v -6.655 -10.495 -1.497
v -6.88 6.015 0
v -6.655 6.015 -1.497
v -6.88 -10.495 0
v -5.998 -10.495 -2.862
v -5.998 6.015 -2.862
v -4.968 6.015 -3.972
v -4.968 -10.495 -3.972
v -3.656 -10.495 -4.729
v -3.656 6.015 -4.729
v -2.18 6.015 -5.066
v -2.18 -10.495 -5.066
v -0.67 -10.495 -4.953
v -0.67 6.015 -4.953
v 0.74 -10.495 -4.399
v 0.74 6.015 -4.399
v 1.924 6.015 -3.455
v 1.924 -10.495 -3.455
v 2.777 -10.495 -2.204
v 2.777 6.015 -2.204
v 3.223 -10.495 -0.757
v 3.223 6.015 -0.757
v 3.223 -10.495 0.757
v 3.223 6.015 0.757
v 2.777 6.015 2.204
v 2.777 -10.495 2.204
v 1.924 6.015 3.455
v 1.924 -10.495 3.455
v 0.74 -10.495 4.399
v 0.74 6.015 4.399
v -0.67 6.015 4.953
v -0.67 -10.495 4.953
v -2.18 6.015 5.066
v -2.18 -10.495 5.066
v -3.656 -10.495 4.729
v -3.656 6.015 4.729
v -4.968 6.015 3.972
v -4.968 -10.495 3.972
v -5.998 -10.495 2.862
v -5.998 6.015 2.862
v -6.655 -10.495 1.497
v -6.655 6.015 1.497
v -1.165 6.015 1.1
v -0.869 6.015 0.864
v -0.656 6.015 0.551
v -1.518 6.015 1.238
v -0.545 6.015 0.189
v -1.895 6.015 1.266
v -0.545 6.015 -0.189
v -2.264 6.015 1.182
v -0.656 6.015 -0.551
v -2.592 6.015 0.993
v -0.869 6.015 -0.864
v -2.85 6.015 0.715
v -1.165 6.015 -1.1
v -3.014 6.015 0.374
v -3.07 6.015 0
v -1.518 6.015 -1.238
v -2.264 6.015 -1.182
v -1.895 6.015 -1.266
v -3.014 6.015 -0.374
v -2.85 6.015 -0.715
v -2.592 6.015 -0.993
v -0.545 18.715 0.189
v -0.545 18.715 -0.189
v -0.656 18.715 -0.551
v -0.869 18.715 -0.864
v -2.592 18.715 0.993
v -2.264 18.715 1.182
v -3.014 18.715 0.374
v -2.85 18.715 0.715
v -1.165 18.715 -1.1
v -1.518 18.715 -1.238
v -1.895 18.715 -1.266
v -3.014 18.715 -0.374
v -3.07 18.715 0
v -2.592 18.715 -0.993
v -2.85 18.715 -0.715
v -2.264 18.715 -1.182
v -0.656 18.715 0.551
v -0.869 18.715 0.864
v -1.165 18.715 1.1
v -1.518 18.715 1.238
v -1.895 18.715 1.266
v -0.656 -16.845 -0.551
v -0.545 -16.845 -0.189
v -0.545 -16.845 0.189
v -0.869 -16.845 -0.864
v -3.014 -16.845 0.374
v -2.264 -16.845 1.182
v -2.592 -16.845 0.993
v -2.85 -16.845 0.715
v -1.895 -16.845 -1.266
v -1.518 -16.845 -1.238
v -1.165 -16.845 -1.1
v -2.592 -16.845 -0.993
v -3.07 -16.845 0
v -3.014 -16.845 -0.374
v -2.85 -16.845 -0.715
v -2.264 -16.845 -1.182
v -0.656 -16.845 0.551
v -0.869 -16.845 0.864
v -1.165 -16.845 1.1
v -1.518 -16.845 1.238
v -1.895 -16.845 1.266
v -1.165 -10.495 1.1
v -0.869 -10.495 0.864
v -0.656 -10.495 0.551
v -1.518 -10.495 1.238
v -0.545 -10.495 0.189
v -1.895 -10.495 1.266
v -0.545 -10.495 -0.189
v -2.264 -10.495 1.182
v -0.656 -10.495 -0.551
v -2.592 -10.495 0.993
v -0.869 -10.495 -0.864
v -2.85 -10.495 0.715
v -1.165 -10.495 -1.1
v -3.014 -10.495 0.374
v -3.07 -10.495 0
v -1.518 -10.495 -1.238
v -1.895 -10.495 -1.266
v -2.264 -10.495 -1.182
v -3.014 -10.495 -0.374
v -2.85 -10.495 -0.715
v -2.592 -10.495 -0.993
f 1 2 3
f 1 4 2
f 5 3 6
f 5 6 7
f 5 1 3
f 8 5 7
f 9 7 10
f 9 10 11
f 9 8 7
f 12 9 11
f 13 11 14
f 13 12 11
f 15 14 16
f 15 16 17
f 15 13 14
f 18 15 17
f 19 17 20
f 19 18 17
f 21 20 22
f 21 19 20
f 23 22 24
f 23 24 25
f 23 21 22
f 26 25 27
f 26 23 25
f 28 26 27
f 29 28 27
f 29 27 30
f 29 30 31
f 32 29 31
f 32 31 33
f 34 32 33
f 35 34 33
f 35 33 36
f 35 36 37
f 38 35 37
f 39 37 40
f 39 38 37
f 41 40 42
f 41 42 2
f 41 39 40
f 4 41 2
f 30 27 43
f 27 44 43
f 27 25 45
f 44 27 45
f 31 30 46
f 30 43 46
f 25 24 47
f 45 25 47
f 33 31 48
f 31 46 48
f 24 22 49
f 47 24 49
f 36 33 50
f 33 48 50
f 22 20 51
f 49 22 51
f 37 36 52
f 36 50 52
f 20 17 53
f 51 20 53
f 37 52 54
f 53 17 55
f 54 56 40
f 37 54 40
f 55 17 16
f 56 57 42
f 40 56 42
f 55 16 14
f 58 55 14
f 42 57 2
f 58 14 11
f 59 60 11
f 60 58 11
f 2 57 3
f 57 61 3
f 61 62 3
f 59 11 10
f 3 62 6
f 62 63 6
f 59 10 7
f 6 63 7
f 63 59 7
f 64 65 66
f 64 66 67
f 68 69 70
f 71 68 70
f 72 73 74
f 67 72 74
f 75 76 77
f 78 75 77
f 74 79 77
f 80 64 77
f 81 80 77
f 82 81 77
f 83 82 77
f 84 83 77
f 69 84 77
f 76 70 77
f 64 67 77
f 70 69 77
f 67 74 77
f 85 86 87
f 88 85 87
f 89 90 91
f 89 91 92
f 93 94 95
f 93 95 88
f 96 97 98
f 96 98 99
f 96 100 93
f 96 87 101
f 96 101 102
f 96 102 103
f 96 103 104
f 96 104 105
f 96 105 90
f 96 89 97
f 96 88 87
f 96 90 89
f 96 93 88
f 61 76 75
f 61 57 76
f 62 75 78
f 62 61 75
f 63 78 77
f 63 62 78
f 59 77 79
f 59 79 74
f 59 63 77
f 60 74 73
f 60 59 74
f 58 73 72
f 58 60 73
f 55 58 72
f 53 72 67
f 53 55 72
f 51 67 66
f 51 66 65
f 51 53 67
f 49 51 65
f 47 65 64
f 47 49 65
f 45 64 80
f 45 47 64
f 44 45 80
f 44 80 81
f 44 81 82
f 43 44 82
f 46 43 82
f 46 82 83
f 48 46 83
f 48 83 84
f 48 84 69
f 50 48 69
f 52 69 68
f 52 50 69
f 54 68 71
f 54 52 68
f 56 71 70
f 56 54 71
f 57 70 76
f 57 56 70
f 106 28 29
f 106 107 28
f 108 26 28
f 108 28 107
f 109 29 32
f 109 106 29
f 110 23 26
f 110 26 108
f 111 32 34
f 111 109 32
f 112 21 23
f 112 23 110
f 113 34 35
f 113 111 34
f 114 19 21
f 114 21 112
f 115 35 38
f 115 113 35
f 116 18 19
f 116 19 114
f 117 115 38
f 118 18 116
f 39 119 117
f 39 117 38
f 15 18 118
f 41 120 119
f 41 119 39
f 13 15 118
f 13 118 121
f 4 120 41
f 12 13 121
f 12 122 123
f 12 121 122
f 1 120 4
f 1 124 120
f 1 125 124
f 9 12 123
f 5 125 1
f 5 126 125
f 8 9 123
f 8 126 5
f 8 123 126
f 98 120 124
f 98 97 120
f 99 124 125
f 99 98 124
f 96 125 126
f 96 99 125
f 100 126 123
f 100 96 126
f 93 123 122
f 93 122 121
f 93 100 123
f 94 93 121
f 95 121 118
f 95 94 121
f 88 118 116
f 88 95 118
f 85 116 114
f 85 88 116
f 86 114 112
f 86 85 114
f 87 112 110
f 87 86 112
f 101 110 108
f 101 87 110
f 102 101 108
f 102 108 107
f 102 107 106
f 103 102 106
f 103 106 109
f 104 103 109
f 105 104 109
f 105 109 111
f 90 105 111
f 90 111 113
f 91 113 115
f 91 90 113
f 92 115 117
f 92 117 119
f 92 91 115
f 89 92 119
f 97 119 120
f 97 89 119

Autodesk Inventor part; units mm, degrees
ref_plane "YZ Plane" through (0, 0, 0) normal (1, 0, 0) x (0, 1, 0)
ref_plane "XZ Plane" through (0, 0, 0) normal (0, 1, 0) x (-1, 0, 0)
ref_plane "XY Plane" through (0, 0, 0) normal (0, 0, 1) x (1, 0, 0)
sketch "Sketch1" plane through (0, 0, 0) normal (0, 0, 1) x (1, 0, 0)
  line L0 (-3.0704, 18.7151) -> (-3.0704, 6.0151)
  line L1 (-3.0704, 6.0151) -> (-6.8804, 6.0151)
  line L2 (-6.8804, 6.0151) -> (-6.8804, -10.4949)
  line L3 (-6.8804, -10.4949) -> (-3.0704, -10.4949)
  line L4 (-3.0704, -10.4949) -> (-3.0704, -16.8449)
  line L5 (-3.0704, -16.8449) -> (-1.8004, -16.8449)
  line L6 (-1.8004, 18.7151) -> (-3.0704, 18.7151)
  line L7 (-1.8004, 18.7151) -> (-1.8004, -16.8449)
  dimension "d0" = 16.51
  dimension "d1" = 12.7
  dimension "d3" = 1.27
  dimension "d8" = 5.08
  dimension "d9" = 6.35
revolve "Revolution1" add sketch "Sketch1" angle 360 about axis through (-1.8004, 18.7151, 0) along (0, -1, 0)
properties part number "roll1"
